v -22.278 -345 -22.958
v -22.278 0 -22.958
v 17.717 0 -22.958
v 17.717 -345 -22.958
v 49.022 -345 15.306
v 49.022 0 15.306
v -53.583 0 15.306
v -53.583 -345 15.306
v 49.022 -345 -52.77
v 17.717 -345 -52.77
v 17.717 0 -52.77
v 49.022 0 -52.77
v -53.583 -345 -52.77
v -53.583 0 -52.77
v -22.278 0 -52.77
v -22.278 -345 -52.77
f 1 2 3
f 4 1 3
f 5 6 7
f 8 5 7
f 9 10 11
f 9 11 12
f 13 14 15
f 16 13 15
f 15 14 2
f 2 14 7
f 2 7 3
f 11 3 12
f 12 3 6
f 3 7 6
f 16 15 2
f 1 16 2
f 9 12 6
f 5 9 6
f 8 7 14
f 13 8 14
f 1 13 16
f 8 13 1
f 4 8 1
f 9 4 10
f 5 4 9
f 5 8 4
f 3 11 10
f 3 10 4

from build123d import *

# Parameters (mm, degrees)
F0_W     = 31.305283
F0_H     = 29.811561
F0_H_2   = 38.264022
F0_W_2   = 39.995074
F0_W_3   = 31.305284
F1_DEPTH = 345


with BuildPart() as f1:
    # F0 (on Front) → F1 (new body)
    with BuildSketch(Plane.XZ):
        with Locations((-37.930622, -37.864193)):
            Rectangle(F0_W, F0_H)
        with Locations((-37.930622, -3.826402)):
            Rectangle(F0_W, F0_H_2)
        with Locations((-2.280444, -3.826402)):
            Rectangle(F0_W_2, F0_H_2)
        with Locations((33.369735, -3.826402)):
            Rectangle(F0_W_3, F0_H_2)
        with Locations((33.369735, -37.864193)):
            Rectangle(F0_W_3, F0_H)
    extrude(amount=F1_DEPTH)


solid = f1.part
